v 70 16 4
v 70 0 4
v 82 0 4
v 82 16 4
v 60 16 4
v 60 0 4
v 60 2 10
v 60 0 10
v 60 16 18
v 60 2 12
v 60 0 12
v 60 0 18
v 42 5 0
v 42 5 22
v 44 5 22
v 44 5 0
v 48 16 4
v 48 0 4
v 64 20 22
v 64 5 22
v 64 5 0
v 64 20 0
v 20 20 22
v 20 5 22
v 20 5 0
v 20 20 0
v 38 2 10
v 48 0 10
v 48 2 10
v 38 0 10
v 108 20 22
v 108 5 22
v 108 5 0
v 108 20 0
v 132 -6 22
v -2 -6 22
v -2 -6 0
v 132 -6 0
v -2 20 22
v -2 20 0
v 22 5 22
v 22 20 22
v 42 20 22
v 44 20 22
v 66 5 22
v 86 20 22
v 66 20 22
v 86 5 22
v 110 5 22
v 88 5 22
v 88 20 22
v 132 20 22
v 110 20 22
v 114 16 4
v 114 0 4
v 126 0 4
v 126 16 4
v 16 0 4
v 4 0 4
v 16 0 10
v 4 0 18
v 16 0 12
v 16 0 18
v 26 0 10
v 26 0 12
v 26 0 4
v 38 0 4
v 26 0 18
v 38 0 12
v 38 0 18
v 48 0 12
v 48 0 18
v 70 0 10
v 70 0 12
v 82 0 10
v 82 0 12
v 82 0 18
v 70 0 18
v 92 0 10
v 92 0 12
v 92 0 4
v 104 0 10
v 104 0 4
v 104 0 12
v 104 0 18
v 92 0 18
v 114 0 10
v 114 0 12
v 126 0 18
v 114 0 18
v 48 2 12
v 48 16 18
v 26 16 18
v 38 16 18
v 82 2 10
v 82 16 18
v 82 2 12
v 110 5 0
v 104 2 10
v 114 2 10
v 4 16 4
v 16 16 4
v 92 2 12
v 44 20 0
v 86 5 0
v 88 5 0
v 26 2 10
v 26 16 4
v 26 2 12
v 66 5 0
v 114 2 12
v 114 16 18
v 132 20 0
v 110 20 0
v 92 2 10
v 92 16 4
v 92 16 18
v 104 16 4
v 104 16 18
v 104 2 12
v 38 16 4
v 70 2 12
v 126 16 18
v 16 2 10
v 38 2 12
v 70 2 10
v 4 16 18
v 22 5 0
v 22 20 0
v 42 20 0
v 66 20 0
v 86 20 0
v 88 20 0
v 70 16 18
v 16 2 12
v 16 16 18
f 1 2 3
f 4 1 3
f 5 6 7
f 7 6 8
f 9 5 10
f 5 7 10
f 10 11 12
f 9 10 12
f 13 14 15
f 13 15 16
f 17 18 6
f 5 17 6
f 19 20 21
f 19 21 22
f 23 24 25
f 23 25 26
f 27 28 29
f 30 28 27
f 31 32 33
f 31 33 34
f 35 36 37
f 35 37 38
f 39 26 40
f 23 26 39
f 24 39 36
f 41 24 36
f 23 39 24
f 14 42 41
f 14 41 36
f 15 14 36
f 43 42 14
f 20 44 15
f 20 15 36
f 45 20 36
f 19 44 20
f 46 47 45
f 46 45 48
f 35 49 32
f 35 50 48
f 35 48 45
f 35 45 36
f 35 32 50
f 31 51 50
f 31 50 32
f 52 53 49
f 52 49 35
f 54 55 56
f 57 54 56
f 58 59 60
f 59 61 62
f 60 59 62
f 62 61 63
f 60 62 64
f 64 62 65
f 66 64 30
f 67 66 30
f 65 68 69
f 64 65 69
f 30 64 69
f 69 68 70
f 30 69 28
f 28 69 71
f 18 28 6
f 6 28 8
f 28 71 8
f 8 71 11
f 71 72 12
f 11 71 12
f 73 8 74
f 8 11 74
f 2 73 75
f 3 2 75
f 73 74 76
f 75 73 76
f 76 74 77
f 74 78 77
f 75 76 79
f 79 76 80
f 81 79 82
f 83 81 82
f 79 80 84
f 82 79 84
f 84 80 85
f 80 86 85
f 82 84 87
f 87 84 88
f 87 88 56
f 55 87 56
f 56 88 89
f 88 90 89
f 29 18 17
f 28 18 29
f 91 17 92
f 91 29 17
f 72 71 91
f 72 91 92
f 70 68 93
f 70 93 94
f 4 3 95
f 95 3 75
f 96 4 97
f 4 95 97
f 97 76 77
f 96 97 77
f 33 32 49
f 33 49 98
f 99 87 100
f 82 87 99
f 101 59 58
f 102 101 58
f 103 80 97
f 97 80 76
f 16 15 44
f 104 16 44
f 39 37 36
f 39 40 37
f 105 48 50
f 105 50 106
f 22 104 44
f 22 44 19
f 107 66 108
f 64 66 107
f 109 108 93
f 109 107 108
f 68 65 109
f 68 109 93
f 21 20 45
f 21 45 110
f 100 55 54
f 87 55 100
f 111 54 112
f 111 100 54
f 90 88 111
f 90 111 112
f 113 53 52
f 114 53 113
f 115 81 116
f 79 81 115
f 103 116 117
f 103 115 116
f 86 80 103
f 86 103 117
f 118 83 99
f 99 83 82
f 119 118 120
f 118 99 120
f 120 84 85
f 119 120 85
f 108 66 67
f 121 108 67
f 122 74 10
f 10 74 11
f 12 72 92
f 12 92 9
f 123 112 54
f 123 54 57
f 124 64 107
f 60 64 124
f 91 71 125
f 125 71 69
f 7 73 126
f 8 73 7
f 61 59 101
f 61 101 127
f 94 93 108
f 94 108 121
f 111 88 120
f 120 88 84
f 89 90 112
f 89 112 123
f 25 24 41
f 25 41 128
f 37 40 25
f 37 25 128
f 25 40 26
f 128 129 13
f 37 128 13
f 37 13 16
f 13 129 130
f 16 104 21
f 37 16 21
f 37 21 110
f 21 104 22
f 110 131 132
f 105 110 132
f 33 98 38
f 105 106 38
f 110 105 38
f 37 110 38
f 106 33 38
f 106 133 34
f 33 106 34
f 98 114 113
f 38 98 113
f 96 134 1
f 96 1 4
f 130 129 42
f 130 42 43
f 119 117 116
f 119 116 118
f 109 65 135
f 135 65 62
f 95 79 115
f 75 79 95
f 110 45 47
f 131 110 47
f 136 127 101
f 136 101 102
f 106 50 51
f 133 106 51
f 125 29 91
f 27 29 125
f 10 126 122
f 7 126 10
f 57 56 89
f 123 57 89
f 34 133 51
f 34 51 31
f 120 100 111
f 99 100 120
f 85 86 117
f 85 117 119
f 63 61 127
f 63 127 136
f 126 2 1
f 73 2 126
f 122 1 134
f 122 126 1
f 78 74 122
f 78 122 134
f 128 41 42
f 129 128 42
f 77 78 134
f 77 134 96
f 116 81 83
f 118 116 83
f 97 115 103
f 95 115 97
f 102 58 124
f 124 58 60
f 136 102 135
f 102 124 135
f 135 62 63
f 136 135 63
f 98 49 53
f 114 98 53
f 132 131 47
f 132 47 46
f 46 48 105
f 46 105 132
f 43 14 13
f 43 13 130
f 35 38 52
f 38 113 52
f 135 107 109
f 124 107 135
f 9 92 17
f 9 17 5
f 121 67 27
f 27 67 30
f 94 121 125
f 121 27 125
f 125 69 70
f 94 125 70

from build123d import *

# Parameters (mm, degrees)
SKETCH1_W           = 20
SKETCH1_H           = 20
BOSS_EXTRUDE1_DEPTH = 22
SKETCH2_W           = 12
SKETCH2_H           = 14
CUT_EXTRUDE1_DEPTH  = 16
SKETCH3_W           = 22
SKETCH3_H           = 5
BOSS_EXTRUDE2_DEPTH = 2
LPATTERN1_COUNT     = 6
LPATTERN1_PITCH     = 22
SKETCH4_W           = 22
SKETCH4_H           = 15
BOSS_EXTRUDE3_DEPTH = 2
SKETCH5_W           = 22
SKETCH5_H           = 20
BOSS_EXTRUDE4_DEPTH = 2
SKETCH6_W           = 122
SKETCH6_H           = 2
CUT_EXTRUDE2_DEPTH  = 2
SKETCH7_W           = 134
SKETCH7_H           = 22
BOSS_EXTRUDE5_DEPTH = 6


with BuildPart() as part:
    # Sketch1 → Boss-Extrude1 (new body)
    with BuildSketch(Plane.XY):
        with Locations((10, 10)):
            Rectangle(SKETCH1_W, SKETCH1_H)
    extrude(amount=BOSS_EXTRUDE1_DEPTH)

    # Sketch2 → Cut-Extrude1 (cut)
    with BuildSketch(Plane.XZ):
        with Locations((10, 11)):
            Rectangle(SKETCH2_W, SKETCH2_H)
    extrude(amount=-CUT_EXTRUDE1_DEPTH, mode=Mode.SUBTRACT)

    # Sketch3 → Boss-Extrude2 (add)
    with BuildSketch(Plane(origin=(20, 0, 0), x_dir=(0, 0, -1), z_dir=(1, 0, 0))):
        with Locations((-11, 2.5)):
            Rectangle(SKETCH3_W, SKETCH3_H)
    extrude(amount=BOSS_EXTRUDE2_DEPTH)


with BuildPart() as lpattern1_1:
    # LPattern1: pattern copy
    add(part.part.moved(Location(Vector(1, 0, 0) * (1 * LPATTERN1_PITCH))))


with BuildPart() as lpattern1_2:
    # LPattern1: pattern copy
    add(part.part.moved(Location(Vector(1, 0, 0) * (2 * LPATTERN1_PITCH))))


with BuildPart() as lpattern1_3:
    # LPattern1: pattern copy
    add(part.part.moved(Location(Vector(1, 0, 0) * (3 * LPATTERN1_PITCH))))


with BuildPart() as lpattern1_4:
    # LPattern1: pattern copy
    add(part.part.moved(Location(Vector(1, 0, 0) * (4 * LPATTERN1_PITCH))))


with BuildPart() as lpattern1_5:
    # LPattern1: pattern copy
    add(part.part.moved(Location(Vector(1, 0, 0) * (5 * LPATTERN1_PITCH))))


with BuildPart() as part_1:
    add(part.part)

    # Combine1: union LPattern1_1, LPattern1_2, LPattern1_3, LPattern1_4, LPattern1_5
    add(lpattern1_1.part)
    add(lpattern1_2.part)
    add(lpattern1_3.part)
    add(lpattern1_4.part)
    add(lpattern1_5.part)

    # Sketch4 → Boss-Extrude3 (add)
    with BuildSketch(Plane(origin=(130, 0, 0), x_dir=(0, 0, -1), z_dir=(1, 0, 0))):
        with Locations((-11, 12.5)):
            Rectangle(SKETCH4_W, SKETCH4_H)
    extrude(amount=BOSS_EXTRUDE3_DEPTH)

    # Sketch5 → Boss-Extrude4 (add)
    with BuildSketch(Plane.ZY):
        with Locations((11, 10)):
            Rectangle(SKETCH5_W, SKETCH5_H)
    extrude(amount=BOSS_EXTRUDE4_DEPTH)

    # Sketch6 → Cut-Extrude2 (cut)
    with BuildSketch(Plane(origin=(0, 0, 0), x_dir=(-1, 0, 0), z_dir=(0, -1, 0))):
        with Locations((-65, -11)):
            Rectangle(SKETCH6_W, SKETCH6_H)
    extrude(amount=-CUT_EXTRUDE2_DEPTH, mode=Mode.SUBTRACT)

    # Sketch7 → Boss-Extrude5 (add)
    with BuildSketch(Plane.XZ):
        with Locations((65, 11)):
            Rectangle(SKETCH7_W, SKETCH7_H)
    extrude(amount=BOSS_EXTRUDE5_DEPTH)


solid = part_1.part
